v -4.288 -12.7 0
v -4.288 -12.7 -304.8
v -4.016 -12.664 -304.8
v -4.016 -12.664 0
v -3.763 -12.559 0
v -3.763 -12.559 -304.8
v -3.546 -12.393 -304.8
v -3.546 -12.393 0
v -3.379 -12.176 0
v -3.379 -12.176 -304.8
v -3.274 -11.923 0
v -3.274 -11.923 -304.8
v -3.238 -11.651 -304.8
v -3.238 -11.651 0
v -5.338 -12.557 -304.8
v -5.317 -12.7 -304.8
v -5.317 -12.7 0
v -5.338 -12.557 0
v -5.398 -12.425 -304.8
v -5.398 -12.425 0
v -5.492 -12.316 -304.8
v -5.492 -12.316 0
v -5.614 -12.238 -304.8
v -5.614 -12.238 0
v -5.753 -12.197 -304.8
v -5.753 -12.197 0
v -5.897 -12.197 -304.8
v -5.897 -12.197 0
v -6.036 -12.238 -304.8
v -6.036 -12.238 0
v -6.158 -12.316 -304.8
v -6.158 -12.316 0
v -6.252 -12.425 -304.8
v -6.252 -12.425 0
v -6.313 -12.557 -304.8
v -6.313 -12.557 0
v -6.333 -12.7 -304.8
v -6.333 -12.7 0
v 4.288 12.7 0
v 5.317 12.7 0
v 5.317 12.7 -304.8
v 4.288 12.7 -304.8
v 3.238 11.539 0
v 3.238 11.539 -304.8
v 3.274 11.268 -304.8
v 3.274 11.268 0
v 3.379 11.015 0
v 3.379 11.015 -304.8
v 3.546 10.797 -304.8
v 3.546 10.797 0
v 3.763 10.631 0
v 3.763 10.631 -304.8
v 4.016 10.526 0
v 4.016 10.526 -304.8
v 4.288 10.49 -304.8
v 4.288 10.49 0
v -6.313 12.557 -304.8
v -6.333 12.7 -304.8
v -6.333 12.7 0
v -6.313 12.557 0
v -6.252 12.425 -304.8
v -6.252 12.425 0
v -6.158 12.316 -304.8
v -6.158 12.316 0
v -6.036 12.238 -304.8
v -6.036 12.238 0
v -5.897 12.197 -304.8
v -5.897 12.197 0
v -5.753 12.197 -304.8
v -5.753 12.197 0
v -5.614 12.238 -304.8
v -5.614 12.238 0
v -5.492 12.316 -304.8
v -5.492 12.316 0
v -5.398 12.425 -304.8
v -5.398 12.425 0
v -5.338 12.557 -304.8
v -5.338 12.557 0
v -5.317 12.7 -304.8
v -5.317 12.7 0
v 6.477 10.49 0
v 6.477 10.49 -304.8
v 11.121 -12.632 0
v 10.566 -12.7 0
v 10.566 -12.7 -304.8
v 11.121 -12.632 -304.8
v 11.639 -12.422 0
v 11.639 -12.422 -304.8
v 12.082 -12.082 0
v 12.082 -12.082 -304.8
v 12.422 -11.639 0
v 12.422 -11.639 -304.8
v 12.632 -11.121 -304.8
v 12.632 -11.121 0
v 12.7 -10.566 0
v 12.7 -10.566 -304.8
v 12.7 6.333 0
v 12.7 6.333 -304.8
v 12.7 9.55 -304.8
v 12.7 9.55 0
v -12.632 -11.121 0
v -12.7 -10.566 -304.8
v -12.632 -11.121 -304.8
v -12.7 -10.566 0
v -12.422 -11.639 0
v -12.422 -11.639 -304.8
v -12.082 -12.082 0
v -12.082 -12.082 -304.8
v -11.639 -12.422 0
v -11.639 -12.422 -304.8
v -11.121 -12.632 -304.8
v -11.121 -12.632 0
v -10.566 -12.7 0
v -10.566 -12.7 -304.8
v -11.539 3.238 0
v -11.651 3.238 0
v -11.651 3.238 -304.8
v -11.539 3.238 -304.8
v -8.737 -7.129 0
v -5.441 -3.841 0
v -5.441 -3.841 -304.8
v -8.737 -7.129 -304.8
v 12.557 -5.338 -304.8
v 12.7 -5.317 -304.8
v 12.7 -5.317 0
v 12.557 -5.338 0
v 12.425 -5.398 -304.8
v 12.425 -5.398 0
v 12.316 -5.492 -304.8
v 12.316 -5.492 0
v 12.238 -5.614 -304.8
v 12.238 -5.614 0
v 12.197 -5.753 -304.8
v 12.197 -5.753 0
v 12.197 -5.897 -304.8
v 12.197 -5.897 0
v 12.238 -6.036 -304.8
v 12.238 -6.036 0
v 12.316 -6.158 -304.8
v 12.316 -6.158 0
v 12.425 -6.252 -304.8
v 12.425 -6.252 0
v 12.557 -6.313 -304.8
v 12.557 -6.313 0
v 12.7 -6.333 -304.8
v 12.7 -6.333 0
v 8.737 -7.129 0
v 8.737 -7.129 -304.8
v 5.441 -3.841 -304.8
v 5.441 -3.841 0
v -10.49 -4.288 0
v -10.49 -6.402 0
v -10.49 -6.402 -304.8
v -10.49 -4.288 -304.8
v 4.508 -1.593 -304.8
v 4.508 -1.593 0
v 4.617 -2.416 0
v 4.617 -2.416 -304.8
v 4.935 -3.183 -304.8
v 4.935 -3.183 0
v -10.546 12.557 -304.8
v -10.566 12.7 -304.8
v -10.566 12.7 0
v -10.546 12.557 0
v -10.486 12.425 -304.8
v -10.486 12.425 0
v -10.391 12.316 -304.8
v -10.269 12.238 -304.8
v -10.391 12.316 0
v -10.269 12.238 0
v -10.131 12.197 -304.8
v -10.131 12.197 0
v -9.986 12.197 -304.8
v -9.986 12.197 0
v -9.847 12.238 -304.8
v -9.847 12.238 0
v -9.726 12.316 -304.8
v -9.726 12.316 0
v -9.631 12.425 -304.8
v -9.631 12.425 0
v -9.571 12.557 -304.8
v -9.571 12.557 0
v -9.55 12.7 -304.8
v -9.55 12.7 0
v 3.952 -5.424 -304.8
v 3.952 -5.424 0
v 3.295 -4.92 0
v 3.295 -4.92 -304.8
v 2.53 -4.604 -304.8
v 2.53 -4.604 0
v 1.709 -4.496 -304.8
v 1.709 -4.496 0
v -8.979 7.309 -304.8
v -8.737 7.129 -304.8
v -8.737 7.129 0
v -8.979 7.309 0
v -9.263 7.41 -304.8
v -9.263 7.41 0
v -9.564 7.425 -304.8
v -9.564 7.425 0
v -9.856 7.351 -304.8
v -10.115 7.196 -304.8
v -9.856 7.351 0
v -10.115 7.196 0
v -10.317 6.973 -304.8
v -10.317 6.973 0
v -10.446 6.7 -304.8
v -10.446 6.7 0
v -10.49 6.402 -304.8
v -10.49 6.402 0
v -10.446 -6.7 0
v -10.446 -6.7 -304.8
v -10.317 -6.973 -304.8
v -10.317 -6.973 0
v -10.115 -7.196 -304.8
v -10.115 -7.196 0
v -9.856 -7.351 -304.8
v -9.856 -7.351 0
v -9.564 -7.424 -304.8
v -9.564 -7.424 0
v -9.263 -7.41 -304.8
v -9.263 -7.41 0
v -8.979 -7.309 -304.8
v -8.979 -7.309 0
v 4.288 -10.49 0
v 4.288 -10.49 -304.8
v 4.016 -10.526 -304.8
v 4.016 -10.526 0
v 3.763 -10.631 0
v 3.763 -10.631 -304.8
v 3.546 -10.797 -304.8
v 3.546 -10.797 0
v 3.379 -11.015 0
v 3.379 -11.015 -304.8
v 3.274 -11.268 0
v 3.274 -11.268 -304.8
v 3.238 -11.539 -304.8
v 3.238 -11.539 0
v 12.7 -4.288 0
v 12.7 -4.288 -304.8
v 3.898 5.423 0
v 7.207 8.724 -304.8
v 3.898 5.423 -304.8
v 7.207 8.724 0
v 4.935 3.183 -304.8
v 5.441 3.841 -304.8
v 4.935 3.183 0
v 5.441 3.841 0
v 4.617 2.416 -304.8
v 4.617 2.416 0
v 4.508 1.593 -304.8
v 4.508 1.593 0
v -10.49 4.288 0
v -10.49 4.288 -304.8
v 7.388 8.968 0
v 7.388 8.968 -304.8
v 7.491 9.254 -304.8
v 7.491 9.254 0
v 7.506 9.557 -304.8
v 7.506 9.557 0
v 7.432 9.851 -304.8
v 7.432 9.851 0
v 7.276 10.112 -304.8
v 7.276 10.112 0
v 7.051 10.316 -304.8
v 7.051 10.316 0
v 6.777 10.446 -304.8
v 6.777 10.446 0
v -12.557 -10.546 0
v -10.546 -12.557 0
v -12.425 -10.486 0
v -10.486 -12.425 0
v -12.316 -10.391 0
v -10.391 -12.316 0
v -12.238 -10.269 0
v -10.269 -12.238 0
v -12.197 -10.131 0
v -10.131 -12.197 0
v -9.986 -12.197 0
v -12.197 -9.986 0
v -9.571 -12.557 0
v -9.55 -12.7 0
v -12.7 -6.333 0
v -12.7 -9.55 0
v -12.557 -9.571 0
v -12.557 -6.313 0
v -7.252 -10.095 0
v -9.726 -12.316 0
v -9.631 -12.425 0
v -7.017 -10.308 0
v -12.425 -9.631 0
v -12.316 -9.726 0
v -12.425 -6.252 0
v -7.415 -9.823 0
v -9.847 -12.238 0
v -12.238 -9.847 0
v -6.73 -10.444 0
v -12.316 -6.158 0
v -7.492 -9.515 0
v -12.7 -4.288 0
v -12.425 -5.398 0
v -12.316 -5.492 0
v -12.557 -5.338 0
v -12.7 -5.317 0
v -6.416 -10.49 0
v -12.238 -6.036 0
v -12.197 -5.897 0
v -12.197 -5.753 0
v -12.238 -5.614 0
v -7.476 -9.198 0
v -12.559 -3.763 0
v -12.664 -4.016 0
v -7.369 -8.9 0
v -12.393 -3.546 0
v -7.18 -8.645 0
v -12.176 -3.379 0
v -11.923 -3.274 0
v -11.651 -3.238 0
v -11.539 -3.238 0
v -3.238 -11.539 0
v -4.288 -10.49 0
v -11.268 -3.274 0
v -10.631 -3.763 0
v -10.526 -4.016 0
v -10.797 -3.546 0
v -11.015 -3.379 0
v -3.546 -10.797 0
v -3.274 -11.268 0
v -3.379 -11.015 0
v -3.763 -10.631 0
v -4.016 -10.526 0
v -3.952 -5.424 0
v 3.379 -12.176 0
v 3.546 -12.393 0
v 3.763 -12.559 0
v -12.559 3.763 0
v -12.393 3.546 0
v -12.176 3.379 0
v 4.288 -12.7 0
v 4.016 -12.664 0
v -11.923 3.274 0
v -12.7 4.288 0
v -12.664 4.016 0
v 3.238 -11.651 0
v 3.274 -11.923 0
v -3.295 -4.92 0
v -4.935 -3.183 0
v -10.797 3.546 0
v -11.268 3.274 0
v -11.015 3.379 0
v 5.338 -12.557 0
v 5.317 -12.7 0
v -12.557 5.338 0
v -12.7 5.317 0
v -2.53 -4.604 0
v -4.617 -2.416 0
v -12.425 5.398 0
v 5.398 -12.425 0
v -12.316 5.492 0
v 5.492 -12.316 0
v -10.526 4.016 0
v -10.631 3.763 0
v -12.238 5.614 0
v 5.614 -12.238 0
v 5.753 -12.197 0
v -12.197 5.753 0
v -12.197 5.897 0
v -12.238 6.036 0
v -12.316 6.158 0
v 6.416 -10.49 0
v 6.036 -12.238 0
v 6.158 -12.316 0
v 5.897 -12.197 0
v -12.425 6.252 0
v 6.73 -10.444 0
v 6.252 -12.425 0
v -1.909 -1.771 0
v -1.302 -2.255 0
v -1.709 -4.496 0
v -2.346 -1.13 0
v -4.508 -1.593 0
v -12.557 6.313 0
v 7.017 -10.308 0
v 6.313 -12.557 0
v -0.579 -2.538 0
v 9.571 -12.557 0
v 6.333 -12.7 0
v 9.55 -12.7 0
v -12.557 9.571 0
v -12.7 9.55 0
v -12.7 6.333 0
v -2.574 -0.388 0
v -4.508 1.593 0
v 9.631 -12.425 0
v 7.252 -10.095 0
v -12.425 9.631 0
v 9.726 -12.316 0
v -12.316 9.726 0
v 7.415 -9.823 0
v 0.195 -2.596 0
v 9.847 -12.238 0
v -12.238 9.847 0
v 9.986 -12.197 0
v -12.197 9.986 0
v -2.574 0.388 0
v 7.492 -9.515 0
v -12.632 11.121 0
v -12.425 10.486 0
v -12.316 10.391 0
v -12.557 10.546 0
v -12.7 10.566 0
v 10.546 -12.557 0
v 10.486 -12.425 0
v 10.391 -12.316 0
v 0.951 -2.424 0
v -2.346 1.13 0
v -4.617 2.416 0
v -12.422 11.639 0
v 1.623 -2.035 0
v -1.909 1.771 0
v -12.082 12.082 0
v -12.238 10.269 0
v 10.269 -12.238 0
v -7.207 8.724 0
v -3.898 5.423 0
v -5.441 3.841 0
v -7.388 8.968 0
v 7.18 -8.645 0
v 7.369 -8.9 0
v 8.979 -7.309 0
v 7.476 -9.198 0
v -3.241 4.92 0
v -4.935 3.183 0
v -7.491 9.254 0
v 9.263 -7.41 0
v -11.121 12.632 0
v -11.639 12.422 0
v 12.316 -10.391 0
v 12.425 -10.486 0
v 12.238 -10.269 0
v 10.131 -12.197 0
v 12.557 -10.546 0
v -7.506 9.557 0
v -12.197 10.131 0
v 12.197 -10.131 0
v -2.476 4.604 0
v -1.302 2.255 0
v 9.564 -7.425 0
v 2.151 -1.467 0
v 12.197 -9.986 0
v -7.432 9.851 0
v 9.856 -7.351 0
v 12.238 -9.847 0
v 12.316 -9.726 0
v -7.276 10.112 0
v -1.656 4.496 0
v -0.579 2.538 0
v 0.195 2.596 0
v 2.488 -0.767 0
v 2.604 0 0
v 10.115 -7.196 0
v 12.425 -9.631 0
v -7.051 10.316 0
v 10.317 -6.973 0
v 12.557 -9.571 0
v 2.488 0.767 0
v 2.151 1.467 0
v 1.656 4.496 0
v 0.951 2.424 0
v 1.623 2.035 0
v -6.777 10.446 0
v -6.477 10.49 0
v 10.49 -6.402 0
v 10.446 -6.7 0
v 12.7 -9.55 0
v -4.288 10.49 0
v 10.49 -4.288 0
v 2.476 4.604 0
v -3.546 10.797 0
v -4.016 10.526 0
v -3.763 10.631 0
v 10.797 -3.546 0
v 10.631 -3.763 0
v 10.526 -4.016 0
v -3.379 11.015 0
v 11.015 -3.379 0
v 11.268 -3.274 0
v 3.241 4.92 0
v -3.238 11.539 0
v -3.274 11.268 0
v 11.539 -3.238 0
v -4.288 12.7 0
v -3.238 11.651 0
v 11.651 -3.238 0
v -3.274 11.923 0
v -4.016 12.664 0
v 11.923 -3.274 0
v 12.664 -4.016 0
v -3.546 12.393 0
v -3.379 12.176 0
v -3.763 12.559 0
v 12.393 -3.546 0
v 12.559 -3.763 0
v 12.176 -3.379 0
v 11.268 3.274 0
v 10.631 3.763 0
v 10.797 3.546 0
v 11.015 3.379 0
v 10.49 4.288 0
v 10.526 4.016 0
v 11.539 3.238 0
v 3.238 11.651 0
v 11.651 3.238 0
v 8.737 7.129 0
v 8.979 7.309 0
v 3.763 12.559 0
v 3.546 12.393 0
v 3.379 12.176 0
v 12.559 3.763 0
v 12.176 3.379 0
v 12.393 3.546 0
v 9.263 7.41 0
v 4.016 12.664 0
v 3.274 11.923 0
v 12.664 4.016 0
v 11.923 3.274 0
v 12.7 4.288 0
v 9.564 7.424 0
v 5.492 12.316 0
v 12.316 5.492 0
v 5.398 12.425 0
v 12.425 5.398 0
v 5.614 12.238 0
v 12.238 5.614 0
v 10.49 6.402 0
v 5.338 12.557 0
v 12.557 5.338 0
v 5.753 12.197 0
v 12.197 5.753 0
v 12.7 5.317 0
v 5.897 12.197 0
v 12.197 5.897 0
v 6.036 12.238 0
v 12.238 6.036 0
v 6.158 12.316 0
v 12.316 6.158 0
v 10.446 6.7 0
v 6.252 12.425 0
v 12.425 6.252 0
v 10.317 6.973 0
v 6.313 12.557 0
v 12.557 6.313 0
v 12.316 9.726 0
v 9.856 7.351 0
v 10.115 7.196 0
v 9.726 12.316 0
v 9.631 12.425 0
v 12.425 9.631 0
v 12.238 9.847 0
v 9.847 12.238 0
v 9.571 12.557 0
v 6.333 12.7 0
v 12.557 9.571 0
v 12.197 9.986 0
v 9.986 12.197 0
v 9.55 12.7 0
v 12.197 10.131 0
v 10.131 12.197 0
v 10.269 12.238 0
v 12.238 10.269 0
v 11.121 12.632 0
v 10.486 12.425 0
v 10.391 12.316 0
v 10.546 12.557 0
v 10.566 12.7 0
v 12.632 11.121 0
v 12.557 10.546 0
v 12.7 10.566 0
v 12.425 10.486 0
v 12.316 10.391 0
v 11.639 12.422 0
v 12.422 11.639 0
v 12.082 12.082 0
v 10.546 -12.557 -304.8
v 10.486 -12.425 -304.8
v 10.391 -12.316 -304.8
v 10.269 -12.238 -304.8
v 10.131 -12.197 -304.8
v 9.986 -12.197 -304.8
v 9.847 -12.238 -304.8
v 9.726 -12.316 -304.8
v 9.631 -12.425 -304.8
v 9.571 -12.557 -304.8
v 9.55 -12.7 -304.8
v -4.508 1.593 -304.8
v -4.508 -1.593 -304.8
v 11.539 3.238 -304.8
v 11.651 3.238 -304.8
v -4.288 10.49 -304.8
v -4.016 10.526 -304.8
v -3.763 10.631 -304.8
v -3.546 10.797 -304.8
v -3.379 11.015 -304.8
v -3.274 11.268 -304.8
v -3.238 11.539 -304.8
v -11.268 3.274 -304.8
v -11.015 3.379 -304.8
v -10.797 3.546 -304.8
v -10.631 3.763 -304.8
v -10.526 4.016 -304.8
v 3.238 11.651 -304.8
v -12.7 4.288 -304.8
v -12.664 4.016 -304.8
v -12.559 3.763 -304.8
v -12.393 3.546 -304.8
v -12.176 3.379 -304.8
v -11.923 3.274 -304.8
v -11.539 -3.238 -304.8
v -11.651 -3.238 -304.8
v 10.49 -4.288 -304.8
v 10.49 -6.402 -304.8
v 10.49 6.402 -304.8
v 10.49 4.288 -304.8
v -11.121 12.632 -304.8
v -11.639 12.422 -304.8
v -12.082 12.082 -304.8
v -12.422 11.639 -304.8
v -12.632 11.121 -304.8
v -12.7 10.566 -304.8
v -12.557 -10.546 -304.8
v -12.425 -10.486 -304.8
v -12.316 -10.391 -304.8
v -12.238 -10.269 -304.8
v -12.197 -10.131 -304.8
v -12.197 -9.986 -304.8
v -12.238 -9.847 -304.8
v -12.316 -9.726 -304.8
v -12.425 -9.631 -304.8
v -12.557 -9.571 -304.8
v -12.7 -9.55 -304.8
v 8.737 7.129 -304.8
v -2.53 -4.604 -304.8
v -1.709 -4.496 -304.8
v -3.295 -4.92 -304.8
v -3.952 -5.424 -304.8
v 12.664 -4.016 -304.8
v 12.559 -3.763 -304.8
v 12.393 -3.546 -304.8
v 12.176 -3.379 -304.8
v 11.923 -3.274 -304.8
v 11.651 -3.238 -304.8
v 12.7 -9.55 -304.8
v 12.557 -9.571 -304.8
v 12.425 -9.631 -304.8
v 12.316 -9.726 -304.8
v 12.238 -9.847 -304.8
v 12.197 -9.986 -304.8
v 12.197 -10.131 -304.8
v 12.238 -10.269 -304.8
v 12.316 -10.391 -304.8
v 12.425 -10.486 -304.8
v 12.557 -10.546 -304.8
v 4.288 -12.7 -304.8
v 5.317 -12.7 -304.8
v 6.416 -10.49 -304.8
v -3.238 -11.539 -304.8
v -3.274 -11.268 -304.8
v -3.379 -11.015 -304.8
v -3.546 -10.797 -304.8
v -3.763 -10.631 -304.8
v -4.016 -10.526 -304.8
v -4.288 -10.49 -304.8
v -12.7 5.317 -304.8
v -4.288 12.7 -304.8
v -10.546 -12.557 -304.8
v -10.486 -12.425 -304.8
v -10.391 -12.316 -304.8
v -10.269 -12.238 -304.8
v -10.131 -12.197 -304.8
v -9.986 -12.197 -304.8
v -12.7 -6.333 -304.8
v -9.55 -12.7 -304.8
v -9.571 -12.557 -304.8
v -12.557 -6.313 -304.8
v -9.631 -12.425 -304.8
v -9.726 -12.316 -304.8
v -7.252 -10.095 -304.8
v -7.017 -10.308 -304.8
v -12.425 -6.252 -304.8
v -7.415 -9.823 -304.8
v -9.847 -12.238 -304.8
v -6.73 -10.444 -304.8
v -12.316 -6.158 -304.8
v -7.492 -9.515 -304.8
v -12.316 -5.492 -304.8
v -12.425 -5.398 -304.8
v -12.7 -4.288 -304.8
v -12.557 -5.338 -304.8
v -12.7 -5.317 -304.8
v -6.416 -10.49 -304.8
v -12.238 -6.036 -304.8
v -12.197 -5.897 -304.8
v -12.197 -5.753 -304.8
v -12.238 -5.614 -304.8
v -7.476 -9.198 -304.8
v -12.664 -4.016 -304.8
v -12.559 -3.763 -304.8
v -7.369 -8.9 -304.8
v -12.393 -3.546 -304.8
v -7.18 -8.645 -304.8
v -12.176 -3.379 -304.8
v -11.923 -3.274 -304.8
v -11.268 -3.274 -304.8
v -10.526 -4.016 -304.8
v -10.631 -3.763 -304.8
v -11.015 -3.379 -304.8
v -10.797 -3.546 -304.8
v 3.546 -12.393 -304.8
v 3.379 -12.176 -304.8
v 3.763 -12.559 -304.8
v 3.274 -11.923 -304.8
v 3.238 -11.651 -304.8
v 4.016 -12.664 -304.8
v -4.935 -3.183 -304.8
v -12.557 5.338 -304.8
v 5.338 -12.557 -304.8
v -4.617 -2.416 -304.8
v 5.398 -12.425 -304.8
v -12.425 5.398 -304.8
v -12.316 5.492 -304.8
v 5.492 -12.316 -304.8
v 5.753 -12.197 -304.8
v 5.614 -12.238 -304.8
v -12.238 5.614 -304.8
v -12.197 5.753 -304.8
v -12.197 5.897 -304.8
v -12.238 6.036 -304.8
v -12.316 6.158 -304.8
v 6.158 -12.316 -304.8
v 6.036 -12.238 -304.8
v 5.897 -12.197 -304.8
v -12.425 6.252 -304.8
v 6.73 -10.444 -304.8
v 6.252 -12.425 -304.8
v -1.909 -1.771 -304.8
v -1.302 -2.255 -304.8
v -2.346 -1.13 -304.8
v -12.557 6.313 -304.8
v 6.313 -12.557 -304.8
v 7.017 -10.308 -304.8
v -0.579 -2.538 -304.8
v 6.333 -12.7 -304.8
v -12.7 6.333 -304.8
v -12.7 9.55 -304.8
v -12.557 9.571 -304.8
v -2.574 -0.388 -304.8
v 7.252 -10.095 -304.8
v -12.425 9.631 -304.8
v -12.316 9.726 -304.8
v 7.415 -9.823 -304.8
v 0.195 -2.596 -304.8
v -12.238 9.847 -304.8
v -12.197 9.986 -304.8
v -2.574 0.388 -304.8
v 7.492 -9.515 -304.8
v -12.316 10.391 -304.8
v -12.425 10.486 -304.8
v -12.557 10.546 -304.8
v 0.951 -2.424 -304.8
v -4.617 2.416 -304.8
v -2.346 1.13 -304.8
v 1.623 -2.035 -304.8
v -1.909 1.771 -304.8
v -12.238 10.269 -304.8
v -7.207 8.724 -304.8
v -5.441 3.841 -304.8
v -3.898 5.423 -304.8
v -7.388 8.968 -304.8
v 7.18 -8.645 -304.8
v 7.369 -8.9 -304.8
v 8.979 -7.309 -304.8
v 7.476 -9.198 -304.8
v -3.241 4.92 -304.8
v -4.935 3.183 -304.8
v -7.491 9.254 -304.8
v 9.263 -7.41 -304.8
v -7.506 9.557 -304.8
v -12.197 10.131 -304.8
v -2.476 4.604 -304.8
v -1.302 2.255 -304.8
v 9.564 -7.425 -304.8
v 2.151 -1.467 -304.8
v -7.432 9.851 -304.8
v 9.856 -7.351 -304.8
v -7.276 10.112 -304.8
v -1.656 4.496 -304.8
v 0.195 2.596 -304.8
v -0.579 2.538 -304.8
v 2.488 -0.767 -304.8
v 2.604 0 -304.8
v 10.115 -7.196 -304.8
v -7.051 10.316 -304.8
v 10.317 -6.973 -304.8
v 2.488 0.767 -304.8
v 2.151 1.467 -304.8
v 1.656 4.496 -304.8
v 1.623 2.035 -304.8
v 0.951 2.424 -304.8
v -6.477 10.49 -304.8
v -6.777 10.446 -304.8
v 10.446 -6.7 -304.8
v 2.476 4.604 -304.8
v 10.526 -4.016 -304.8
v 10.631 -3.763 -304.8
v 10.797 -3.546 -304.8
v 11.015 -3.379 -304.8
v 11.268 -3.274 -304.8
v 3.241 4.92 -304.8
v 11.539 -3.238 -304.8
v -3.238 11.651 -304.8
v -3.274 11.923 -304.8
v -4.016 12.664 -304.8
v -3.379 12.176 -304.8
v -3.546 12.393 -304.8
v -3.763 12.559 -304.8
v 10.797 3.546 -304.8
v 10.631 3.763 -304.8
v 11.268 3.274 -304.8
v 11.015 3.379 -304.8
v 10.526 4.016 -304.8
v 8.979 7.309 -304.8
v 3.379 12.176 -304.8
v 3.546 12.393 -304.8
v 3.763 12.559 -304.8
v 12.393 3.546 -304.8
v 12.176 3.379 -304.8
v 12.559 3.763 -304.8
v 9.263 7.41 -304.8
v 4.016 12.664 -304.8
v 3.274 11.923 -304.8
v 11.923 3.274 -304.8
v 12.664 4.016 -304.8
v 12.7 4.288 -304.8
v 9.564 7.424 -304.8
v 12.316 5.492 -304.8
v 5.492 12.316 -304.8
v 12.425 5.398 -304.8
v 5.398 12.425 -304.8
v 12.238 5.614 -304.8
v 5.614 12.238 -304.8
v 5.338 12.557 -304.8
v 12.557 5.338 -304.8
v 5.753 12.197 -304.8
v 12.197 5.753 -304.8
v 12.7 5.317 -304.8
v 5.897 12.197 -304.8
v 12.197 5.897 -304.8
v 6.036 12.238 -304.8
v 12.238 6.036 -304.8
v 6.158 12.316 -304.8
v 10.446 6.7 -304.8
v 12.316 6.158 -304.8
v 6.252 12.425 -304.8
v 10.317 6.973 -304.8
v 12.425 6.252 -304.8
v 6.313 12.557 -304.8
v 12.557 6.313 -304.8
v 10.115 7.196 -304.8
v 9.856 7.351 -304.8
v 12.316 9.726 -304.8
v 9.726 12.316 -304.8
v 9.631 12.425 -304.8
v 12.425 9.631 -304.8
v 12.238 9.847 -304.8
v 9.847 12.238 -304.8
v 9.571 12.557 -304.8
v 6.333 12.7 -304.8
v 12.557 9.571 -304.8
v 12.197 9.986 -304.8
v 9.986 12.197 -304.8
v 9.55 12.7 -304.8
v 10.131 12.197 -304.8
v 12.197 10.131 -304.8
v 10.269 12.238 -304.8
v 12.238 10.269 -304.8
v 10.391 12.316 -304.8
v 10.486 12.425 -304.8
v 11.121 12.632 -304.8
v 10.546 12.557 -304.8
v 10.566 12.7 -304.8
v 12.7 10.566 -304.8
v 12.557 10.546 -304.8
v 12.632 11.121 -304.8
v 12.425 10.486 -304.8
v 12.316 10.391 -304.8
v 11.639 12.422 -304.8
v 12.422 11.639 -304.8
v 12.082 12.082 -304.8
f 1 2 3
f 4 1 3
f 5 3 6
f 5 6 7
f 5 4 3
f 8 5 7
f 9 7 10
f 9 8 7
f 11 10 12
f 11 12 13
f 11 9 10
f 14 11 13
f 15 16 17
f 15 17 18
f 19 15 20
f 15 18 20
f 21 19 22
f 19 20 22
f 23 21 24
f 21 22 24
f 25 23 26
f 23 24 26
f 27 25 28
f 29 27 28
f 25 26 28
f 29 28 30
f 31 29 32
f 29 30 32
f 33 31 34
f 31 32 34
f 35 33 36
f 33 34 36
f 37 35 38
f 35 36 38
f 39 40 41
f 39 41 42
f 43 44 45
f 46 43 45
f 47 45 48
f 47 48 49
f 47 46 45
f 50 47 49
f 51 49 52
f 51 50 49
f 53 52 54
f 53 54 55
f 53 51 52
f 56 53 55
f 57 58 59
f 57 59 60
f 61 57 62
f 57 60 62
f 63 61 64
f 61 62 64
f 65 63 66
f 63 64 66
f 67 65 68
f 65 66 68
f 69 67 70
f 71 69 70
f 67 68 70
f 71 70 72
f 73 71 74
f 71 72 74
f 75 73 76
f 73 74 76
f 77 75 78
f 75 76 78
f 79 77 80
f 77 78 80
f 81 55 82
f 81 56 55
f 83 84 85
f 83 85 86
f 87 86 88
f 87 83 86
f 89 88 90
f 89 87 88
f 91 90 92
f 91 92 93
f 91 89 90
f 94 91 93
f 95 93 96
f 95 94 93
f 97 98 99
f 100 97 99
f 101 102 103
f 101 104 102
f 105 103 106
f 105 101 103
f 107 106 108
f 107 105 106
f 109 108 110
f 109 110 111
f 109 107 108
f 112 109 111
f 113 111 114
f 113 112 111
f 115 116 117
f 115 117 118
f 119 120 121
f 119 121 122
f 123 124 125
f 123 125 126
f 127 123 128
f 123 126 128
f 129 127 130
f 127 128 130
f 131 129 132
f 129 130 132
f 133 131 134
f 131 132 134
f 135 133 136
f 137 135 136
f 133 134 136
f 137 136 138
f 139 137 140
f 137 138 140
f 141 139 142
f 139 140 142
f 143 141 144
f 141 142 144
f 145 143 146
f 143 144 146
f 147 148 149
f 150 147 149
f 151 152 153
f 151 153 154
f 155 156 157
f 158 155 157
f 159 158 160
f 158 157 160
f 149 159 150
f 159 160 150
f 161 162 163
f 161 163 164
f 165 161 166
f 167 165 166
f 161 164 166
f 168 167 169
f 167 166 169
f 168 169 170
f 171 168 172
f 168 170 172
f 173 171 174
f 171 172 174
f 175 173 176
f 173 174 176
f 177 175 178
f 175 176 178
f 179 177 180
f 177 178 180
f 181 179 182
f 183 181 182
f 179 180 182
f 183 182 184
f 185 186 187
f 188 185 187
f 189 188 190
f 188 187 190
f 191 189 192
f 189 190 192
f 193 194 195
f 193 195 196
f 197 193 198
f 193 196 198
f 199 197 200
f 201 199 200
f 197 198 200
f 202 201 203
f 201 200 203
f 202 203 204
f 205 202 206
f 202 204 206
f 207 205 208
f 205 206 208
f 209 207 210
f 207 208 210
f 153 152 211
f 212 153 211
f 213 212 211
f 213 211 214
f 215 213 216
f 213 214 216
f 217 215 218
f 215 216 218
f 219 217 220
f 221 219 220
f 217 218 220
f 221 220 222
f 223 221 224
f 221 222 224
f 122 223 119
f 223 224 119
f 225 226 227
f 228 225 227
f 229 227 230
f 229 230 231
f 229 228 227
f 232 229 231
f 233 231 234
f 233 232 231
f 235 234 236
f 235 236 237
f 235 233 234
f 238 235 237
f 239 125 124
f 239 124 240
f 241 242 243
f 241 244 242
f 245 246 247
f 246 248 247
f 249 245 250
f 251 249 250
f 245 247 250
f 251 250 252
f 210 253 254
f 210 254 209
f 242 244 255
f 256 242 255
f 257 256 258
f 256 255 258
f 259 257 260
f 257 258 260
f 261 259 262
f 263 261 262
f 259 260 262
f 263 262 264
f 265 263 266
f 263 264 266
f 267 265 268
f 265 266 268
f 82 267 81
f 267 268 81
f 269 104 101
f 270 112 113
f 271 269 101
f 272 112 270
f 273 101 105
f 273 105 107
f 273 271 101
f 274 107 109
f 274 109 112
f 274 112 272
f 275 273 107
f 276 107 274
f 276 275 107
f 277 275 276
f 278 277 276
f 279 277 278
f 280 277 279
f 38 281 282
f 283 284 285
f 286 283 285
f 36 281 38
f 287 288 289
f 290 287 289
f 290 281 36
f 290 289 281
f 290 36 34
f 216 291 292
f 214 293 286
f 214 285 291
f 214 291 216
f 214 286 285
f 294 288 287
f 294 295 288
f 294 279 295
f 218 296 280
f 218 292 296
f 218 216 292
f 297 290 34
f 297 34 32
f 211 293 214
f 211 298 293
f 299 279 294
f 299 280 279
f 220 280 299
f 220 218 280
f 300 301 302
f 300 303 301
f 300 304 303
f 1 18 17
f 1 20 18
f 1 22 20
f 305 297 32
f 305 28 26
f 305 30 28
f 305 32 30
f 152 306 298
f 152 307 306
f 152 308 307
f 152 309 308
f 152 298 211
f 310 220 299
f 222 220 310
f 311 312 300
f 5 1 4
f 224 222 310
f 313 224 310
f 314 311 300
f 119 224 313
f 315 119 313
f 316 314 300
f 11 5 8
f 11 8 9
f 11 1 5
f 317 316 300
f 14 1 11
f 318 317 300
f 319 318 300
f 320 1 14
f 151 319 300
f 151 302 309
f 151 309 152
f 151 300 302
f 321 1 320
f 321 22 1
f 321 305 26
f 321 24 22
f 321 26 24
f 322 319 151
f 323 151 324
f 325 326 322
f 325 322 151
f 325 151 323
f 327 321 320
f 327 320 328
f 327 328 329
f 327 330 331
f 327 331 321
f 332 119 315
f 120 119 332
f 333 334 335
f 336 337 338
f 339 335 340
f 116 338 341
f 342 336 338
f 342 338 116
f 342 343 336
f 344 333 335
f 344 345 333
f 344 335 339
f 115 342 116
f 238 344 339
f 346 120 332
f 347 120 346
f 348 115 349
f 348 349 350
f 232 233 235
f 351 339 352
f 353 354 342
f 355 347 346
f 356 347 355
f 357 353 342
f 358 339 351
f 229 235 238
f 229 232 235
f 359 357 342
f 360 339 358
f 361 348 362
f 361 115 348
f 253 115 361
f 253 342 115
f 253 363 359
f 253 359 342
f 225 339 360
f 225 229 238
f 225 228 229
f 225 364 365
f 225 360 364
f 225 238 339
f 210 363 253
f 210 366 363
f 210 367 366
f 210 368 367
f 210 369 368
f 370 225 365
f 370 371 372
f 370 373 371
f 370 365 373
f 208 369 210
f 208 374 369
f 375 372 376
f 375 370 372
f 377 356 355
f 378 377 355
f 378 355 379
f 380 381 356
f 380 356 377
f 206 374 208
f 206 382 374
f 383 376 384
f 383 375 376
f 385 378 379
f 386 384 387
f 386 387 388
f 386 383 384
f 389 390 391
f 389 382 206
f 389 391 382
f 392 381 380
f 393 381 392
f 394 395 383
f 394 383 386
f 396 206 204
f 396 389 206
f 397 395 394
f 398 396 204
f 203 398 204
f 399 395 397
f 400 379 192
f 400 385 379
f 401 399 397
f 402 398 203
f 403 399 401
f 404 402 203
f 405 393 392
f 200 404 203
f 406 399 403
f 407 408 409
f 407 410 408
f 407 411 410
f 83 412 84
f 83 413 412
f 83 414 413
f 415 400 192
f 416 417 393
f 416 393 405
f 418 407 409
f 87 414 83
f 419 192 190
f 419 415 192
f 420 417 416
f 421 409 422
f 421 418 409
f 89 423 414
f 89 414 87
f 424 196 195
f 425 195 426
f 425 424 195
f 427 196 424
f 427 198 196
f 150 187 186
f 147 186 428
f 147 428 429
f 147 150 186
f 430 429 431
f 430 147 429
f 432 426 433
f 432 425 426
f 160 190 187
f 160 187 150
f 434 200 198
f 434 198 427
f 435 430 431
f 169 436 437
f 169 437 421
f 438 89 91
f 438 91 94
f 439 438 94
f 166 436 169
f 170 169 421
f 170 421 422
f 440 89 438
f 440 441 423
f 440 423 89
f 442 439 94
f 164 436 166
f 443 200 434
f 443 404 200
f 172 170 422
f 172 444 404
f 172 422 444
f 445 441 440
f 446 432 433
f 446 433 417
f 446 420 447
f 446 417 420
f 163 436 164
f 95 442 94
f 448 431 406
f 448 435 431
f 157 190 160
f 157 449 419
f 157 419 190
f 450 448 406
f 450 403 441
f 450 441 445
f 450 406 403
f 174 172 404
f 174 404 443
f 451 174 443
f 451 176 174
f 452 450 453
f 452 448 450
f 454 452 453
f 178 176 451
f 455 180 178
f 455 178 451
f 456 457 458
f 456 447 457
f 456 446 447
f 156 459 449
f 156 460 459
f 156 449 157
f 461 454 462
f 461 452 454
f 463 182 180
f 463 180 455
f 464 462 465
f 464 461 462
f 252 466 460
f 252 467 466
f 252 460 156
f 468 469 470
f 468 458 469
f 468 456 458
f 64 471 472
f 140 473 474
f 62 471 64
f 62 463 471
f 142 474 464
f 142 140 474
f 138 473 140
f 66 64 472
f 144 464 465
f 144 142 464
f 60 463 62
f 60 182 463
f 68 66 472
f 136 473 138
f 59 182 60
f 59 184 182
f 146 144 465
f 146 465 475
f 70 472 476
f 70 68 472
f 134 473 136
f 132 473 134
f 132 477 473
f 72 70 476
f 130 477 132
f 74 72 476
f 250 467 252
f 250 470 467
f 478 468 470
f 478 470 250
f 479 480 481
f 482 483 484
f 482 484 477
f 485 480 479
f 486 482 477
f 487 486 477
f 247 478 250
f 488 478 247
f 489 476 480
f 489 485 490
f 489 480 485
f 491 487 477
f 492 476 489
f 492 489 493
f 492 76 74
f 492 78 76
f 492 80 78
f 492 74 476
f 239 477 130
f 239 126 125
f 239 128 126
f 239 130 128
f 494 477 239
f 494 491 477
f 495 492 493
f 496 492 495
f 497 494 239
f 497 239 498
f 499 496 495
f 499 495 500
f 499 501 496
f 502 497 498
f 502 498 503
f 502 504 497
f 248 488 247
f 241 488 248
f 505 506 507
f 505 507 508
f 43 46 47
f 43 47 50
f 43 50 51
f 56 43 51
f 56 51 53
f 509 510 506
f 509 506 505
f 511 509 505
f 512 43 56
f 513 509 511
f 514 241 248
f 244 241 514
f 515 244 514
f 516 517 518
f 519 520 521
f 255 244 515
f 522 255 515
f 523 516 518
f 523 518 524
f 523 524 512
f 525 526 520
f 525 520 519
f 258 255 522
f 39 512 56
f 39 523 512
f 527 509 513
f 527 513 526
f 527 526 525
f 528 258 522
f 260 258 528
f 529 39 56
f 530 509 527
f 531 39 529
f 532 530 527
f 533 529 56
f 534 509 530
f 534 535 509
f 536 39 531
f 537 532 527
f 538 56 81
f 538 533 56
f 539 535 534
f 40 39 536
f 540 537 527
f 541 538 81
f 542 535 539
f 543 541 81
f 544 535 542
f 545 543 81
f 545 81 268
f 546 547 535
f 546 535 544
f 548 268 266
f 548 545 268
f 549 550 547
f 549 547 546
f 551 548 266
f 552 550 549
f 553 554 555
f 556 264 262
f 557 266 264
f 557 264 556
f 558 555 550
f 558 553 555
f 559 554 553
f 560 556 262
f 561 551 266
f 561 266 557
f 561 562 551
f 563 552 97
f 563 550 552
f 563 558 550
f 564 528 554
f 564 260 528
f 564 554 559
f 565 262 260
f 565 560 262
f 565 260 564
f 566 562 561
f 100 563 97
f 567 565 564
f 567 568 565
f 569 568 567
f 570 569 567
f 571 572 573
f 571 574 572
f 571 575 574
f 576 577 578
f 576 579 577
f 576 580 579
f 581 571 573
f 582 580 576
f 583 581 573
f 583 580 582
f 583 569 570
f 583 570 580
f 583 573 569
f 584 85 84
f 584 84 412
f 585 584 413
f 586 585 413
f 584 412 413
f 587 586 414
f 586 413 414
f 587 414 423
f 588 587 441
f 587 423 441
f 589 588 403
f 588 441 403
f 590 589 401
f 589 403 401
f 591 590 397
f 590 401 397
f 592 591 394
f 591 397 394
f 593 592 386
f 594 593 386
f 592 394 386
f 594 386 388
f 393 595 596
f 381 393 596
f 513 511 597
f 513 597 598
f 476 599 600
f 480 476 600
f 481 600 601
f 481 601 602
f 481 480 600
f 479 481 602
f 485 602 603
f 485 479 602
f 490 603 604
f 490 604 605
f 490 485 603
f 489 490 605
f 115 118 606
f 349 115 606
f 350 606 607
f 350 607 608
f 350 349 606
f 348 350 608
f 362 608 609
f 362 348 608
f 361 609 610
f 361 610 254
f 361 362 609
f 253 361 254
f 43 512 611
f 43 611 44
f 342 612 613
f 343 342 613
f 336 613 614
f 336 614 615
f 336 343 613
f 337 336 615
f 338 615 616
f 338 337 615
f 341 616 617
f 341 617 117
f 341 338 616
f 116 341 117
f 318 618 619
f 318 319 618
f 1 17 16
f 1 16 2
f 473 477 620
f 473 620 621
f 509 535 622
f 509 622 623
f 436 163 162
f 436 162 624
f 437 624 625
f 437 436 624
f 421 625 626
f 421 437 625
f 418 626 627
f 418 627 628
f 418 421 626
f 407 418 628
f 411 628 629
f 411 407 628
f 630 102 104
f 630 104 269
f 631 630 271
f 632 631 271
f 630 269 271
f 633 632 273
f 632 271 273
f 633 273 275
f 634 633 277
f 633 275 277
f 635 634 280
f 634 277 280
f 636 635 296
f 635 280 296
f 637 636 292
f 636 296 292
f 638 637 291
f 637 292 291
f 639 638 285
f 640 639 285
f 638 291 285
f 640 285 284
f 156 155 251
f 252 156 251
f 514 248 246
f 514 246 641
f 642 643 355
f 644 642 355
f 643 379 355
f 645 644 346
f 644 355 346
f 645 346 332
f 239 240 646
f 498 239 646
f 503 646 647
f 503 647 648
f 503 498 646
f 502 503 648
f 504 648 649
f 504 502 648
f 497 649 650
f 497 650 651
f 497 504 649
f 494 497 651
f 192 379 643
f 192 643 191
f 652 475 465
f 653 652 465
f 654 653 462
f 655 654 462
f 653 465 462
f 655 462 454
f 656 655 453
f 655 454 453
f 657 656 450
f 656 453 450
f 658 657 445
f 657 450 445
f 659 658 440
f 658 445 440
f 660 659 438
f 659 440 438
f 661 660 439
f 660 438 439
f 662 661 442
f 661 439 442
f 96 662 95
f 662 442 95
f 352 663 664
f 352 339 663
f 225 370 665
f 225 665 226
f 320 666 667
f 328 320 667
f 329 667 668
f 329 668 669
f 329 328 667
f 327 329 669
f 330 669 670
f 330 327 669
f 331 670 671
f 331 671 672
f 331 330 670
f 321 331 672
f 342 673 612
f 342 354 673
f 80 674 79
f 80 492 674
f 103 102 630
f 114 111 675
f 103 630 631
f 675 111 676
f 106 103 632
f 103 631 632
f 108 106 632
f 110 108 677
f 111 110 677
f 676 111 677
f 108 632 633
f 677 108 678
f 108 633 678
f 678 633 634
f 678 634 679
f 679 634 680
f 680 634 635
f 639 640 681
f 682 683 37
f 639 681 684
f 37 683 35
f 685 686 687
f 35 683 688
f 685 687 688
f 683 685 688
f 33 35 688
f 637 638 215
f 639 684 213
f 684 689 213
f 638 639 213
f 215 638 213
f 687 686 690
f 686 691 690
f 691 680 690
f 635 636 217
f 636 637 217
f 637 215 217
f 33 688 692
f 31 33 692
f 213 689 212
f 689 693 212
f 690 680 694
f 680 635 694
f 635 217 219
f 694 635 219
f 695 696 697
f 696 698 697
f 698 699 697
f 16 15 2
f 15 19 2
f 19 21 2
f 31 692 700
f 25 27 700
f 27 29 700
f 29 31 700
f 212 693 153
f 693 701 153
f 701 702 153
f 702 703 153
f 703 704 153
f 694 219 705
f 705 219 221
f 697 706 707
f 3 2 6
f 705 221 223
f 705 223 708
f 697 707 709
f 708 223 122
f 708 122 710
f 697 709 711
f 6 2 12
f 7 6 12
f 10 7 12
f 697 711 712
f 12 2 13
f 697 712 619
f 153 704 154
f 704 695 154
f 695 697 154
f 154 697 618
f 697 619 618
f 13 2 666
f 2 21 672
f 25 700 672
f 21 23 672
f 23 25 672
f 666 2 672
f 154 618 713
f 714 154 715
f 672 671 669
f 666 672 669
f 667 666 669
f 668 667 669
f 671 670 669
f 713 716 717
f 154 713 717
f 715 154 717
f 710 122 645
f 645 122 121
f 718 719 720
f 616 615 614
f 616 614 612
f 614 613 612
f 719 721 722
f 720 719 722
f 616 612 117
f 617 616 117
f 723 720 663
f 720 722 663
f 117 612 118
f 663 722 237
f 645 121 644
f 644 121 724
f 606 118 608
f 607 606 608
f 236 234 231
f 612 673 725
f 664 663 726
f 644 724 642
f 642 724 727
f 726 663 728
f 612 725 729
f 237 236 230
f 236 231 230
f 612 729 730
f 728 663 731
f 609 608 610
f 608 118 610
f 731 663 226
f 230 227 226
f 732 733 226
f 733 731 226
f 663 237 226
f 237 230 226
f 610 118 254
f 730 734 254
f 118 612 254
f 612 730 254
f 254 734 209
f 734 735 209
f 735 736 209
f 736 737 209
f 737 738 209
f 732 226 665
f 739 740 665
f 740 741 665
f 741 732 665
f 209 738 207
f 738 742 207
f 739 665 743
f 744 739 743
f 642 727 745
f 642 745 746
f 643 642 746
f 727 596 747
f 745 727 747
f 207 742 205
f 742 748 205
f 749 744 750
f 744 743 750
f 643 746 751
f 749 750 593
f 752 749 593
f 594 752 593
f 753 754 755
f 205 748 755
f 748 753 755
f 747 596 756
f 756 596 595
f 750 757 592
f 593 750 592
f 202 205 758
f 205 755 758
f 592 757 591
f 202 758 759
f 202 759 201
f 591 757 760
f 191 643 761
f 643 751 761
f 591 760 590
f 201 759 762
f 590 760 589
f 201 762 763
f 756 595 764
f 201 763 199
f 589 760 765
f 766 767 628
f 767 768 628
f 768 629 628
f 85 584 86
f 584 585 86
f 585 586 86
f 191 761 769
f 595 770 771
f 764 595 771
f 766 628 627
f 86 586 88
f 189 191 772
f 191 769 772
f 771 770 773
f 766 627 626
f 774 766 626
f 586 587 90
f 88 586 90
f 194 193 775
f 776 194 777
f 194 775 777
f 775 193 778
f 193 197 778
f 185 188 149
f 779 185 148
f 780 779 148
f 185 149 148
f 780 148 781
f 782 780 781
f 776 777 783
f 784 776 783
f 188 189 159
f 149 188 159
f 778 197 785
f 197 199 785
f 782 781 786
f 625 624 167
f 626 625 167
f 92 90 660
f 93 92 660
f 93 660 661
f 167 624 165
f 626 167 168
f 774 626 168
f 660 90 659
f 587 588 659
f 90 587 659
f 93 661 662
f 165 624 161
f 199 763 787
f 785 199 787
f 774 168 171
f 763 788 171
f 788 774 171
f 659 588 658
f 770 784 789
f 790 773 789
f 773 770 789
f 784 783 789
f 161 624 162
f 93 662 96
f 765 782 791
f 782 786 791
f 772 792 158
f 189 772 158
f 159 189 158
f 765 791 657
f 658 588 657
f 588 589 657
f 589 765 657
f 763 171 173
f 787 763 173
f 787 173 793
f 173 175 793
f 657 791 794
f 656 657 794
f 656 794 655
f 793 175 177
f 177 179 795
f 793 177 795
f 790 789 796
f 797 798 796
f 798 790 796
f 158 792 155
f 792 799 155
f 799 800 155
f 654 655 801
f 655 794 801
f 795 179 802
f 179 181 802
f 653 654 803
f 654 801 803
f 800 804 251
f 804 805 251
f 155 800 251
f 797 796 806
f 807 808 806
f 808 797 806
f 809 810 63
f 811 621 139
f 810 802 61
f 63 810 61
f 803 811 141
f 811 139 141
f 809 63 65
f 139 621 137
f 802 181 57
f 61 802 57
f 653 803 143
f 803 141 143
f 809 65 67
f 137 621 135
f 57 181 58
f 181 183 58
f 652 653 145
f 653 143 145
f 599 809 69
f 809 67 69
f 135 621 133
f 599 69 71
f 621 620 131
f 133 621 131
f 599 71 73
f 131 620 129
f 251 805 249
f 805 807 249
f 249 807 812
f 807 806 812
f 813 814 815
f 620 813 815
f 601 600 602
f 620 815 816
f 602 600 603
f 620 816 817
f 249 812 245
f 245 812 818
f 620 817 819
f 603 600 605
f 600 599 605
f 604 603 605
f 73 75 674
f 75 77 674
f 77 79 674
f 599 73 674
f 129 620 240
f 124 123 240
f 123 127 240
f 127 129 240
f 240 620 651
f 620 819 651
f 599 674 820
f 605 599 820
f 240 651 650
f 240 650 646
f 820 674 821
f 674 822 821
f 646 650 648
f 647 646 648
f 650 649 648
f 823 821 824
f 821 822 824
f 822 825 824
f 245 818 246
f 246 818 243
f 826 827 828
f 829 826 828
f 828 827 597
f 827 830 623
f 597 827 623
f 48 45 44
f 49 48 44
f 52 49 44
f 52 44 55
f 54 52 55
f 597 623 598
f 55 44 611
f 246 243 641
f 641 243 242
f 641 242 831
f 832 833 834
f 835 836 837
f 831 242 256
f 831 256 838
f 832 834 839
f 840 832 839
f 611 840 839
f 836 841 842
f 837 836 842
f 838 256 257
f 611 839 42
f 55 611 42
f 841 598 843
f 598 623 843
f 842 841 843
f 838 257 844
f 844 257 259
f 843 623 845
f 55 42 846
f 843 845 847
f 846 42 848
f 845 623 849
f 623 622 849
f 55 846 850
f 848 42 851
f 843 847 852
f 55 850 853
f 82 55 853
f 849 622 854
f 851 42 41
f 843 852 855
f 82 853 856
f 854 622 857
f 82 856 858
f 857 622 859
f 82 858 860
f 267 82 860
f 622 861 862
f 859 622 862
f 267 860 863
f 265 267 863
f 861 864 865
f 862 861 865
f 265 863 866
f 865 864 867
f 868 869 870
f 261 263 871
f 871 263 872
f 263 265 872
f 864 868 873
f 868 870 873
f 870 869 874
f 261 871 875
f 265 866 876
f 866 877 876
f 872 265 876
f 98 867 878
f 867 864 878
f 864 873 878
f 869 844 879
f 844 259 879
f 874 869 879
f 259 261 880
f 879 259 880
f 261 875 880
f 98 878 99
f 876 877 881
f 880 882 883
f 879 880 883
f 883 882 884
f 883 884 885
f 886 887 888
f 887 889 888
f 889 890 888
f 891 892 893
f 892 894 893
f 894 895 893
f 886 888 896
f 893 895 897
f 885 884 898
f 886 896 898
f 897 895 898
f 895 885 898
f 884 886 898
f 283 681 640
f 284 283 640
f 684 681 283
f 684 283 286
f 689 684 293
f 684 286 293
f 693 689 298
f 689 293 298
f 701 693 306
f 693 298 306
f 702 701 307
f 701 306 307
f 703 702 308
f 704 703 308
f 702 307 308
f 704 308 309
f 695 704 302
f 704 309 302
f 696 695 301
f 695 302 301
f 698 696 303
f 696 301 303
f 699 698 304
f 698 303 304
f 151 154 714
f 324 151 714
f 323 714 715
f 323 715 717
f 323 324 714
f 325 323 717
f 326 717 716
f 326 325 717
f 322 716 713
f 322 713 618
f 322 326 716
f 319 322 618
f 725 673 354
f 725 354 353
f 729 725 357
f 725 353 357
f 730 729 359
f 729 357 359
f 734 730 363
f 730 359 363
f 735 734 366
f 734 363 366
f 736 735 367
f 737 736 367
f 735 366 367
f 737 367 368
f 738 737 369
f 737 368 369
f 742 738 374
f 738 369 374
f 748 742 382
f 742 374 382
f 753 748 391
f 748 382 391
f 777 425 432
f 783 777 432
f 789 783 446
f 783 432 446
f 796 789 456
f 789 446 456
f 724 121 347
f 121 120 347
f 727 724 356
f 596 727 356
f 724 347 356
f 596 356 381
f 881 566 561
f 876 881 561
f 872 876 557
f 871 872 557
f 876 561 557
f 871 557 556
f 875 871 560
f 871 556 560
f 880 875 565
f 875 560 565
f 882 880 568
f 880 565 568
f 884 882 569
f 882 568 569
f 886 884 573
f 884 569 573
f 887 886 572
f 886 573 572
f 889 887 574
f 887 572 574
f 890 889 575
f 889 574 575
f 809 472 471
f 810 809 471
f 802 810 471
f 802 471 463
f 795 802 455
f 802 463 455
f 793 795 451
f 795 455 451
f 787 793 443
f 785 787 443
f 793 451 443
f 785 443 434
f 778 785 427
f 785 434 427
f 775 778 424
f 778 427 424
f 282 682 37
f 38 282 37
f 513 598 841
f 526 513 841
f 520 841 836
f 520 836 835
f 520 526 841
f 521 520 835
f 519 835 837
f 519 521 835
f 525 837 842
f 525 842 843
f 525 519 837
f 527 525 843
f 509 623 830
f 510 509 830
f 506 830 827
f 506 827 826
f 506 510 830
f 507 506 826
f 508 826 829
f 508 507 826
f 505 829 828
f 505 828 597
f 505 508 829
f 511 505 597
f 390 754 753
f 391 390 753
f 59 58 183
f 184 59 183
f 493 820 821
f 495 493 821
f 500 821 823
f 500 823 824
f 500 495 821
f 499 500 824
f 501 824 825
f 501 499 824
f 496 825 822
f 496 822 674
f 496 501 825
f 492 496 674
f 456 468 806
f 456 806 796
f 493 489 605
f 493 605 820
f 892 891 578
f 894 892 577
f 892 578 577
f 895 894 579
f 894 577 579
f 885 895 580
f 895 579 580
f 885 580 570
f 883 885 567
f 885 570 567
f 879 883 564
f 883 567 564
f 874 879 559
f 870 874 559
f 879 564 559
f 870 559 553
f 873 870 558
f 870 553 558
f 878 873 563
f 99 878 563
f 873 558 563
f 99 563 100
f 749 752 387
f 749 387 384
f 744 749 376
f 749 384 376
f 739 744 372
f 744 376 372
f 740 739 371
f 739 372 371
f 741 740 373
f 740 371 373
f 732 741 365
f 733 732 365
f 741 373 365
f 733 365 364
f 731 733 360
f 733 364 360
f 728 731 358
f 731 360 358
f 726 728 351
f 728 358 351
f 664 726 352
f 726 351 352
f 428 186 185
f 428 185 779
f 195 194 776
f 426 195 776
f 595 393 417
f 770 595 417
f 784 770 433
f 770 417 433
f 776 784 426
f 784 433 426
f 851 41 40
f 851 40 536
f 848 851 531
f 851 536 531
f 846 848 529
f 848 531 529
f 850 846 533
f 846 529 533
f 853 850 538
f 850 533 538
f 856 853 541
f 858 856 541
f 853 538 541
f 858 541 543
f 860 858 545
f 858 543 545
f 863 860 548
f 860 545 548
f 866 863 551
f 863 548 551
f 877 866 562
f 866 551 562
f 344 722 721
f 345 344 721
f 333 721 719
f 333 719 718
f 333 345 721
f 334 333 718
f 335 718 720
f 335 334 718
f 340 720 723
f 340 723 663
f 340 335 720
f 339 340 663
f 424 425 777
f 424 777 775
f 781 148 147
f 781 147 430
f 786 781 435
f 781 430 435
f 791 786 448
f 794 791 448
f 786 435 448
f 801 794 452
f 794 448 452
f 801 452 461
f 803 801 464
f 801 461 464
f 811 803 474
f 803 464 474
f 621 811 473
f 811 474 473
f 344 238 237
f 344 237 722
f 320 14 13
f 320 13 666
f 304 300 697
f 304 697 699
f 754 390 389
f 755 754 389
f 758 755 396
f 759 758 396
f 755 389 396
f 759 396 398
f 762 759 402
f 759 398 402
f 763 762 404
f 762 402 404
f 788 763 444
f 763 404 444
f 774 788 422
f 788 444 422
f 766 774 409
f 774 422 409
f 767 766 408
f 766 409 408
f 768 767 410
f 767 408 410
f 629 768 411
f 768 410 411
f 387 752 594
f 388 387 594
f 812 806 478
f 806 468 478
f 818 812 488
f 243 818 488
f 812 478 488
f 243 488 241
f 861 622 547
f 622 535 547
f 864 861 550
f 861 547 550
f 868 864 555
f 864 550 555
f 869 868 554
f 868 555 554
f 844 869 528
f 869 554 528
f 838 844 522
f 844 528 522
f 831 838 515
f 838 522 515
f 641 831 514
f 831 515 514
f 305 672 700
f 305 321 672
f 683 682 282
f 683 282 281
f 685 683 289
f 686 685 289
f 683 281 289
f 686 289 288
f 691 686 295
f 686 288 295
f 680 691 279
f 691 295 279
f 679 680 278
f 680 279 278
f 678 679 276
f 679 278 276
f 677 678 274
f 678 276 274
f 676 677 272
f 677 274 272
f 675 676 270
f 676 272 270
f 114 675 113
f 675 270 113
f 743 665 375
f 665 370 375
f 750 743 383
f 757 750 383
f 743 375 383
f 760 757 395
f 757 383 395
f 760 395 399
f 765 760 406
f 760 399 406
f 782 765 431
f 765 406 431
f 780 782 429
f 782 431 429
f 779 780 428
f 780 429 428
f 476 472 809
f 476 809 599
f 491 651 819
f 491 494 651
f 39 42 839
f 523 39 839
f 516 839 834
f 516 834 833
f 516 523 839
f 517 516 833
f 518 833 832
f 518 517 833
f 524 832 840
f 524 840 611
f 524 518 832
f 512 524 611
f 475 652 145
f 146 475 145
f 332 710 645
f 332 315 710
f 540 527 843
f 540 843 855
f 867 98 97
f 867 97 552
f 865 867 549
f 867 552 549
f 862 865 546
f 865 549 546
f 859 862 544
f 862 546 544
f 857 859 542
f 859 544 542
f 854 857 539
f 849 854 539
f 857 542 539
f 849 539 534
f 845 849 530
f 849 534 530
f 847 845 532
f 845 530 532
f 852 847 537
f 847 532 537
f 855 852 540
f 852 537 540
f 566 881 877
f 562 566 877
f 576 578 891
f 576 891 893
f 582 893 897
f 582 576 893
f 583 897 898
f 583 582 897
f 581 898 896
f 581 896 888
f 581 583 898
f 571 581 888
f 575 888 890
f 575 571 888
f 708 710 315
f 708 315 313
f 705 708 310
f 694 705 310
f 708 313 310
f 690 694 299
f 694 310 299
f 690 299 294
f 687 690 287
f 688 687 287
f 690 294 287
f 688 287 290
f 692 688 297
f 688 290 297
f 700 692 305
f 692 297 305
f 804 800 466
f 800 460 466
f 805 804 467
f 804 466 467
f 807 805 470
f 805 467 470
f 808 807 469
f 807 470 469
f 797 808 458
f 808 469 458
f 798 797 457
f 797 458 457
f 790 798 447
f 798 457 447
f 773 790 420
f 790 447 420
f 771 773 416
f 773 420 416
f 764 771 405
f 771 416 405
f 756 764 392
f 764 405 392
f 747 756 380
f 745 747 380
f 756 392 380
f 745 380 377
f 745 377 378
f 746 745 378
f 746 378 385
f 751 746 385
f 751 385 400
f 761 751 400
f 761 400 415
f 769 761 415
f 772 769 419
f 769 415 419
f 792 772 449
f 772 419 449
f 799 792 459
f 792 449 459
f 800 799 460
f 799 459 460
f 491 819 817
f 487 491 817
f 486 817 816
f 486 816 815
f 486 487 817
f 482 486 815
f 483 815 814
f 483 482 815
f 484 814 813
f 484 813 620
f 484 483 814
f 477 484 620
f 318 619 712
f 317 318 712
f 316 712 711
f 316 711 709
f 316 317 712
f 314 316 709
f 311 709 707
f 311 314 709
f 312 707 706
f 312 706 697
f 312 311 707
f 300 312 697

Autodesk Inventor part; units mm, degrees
ref_plane "YZ Plane" through (0, 0, 0) normal (1, 0, 0) x (0, 1, 0)
ref_plane "XZ Plane" through (0, 0, 0) normal (0, 1, 0) x (-1, 0, 0)
ref_plane "XY Plane" through (0, 0, 0) normal (0, 0, 1) x (1, 0, 0)
sketch "Sketch1" plane through (0, 0, 0) normal (0, 0, 1) x (1, 0, 0)
  circle A0 centre (0, 0) radius 2.6035
  arc A1 (-1.7093, -4.4958) -> (-3.9523, -5.4237) centre (-1.7093, -7.6708) ccw
  line L0 (-1.7093, -4.4958) -> (1.7093, -4.4958)
  arc A2 (3.9523, -5.4237) -> (1.7093, -4.4958) centre (1.7093, -7.6708) ccw
  line L1 (3.9523, -5.4237) -> (7.1797, -8.6452)
  arc A3 (6.4164, -10.4902) -> (7.1797, -8.6452) centre (6.4164, -9.4098) ccw
  line L2 (6.4164, -10.4902) -> (4.2875, -10.4902)
  arc A4 (4.2875, -10.4902) -> (3.2385, -11.5392) centre (4.2875, -11.5392) ccw
  line L3 (3.2385, -11.5392) -> (3.2385, -11.651)
  arc A5 (3.2385, -11.651) -> (4.2875, -12.7) centre (4.2875, -11.651) ccw
  line L4 (4.2875, -12.7) -> (5.3171, -12.7)
  arc A6 (6.3331, -12.7) -> (5.3171, -12.7) centre (5.8251, -12.7) ccw
  line L5 (6.3331, -12.7) -> (9.5504, -12.7)
  arc A7 (10.5664, -12.6998) -> (9.5504, -12.7) centre (10.0584, -12.7) ccw
  arc A8 (10.5664, -12.6998) -> (12.6998, -10.5664) centre (10.5918, -10.5918) ccw
  arc A9 (12.7, -9.5504) -> (12.6998, -10.5664) centre (12.7, -10.0584) ccw
  line L6 (12.7, -9.5504) -> (12.7, -6.3331)
  arc A10 (12.7, -5.3171) -> (12.7, -6.3331) centre (12.7, -5.8251) ccw
  line L7 (12.7, -5.3171) -> (12.7, -4.2875)
  arc A11 (12.7, -4.2875) -> (11.651, -3.2385) centre (11.651, -4.2875) ccw
  line L8 (11.651, -3.2385) -> (11.5392, -3.2385)
  arc A12 (11.5392, -3.2385) -> (10.4902, -4.2875) centre (11.5392, -4.2875) ccw
  line L9 (10.4902, -4.2875) -> (10.4902, -6.4021)
  arc A13 (8.7371, -7.1294) -> (10.4902, -6.4021) centre (9.4628, -6.4021) ccw
  line L10 (8.7371, -7.1294) -> (5.441, -3.8408)
  arc A14 (4.5085, -1.5932) -> (5.441, -3.8408) centre (7.6835, -1.5932) ccw
  line L11 (4.5085, -1.5932) -> (4.5085, 1.5932)
  arc A15 (5.441, 3.8408) -> (4.5085, 1.5932) centre (7.6835, 1.5932) ccw
  line L12 (5.441, 3.8408) -> (8.7371, 7.1294)
  arc A16 (10.4902, 6.4021) -> (8.7371, 7.1294) centre (9.4628, 6.4021) ccw
  line L13 (10.4902, 6.4021) -> (10.4902, 4.2875)
  arc A17 (10.4902, 4.2875) -> (11.5392, 3.2385) centre (11.5392, 4.2875) ccw
  line L14 (11.5392, 3.2385) -> (11.651, 3.2385)
  arc A18 (11.651, 3.2385) -> (12.7, 4.2875) centre (11.651, 4.2875) ccw
  line L15 (12.7, 4.2875) -> (12.7, 5.3171)
  arc A19 (12.7, 6.3331) -> (12.7, 5.3171) centre (12.7, 5.8251) ccw
  line L16 (12.7, 6.3331) -> (12.7, 9.5504)
  arc A20 (12.6998, 10.5664) -> (12.7, 9.5504) centre (12.7, 10.0584) ccw
  arc A21 (12.6998, 10.5664) -> (10.5664, 12.6998) centre (10.5918, 10.5918) ccw
  arc A22 (9.5504, 12.7) -> (10.5664, 12.6998) centre (10.0584, 12.7) ccw
  line L17 (9.5504, 12.7) -> (6.3331, 12.7)
  arc A23 (5.3171, 12.7) -> (6.3331, 12.7) centre (5.8251, 12.7) ccw
  line L18 (5.3171, 12.7) -> (4.2875, 12.7)
  arc A24 (4.2875, 12.7) -> (3.2385, 11.651) centre (4.2875, 11.651) ccw
  line L19 (3.2385, 11.651) -> (3.2385, 11.5392)
  arc A25 (3.2385, 11.5392) -> (4.2875, 10.4902) centre (4.2875, 11.5392) ccw
  line L20 (4.2875, 10.4902) -> (6.4768, 10.4902)
  arc A26 (7.207, 8.7244) -> (6.4768, 10.4902) centre (6.4768, 9.4563) ccw
  line L21 (7.207, 8.7244) -> (3.8983, 5.4232)
  arc A27 (1.6558, 4.4958) -> (3.8983, 5.4232) centre (1.6558, 7.6708) ccw
  line L22 (1.6558, 4.4958) -> (-1.6558, 4.4958)
  arc A28 (-3.8983, 5.4232) -> (-1.6558, 4.4958) centre (-1.6558, 7.6708) ccw
  line L23 (-3.8983, 5.4232) -> (-7.207, 8.7244)
  arc A29 (-6.4768, 10.4902) -> (-7.207, 8.7244) centre (-6.4768, 9.4563) ccw
  line L24 (-6.4768, 10.4902) -> (-4.2875, 10.4902)
  arc A30 (-4.2875, 10.4902) -> (-3.2385, 11.5392) centre (-4.2875, 11.5392) ccw
  line L25 (-3.2385, 11.5392) -> (-3.2385, 11.651)
  arc A31 (-3.2385, 11.651) -> (-4.2875, 12.7) centre (-4.2875, 11.651) ccw
  line L26 (-4.2875, 12.7) -> (-5.3171, 12.7)
  arc A32 (-6.3331, 12.7) -> (-5.3171, 12.7) centre (-5.8251, 12.7) ccw
  line L27 (-6.3331, 12.7) -> (-9.5504, 12.7)
  arc A33 (-10.5664, 12.6998) -> (-9.5504, 12.7) centre (-10.0584, 12.7) ccw
  arc A34 (-10.5664, 12.6998) -> (-12.6998, 10.5664) centre (-10.5918, 10.5918) ccw
  arc A35 (-12.7, 9.5504) -> (-12.6998, 10.5664) centre (-12.7, 10.0584) ccw
  line L28 (-12.7, 9.5504) -> (-12.7, 6.3331)
  arc A36 (-12.7, 5.3171) -> (-12.7, 6.3331) centre (-12.7, 5.8251) ccw
  line L29 (-12.7, 5.3171) -> (-12.7, 4.2875)
  arc A37 (-12.7, 4.2875) -> (-11.651, 3.2385) centre (-11.651, 4.2875) ccw
  line L30 (-11.651, 3.2385) -> (-11.5392, 3.2385)
  arc A38 (-11.5392, 3.2385) -> (-10.4902, 4.2875) centre (-11.5392, 4.2875) ccw
  line L31 (-10.4902, 4.2875) -> (-10.4902, 6.4021)
  arc A39 (-8.7371, 7.1294) -> (-10.4902, 6.4021) centre (-9.4628, 6.4021) ccw
  line L32 (-8.7371, 7.1294) -> (-5.441, 3.8408)
  arc A40 (-4.5085, 1.5932) -> (-5.441, 3.8408) centre (-7.6835, 1.5932) ccw
  line L33 (-4.5085, 1.5932) -> (-4.5085, -1.5932)
  arc A41 (-5.441, -3.8408) -> (-4.5085, -1.5932) centre (-7.6835, -1.5932) ccw
  line L34 (-5.441, -3.8408) -> (-8.7371, -7.1294)
  arc A42 (-10.4902, -6.4021) -> (-8.7371, -7.1294) centre (-9.4628, -6.4021) ccw
  line L35 (-10.4902, -6.4021) -> (-10.4902, -4.2875)
  arc A43 (-10.4902, -4.2875) -> (-11.5392, -3.2385) centre (-11.5392, -4.2875) ccw
  line L36 (-11.5392, -3.2385) -> (-11.651, -3.2385)
  arc A44 (-11.651, -3.2385) -> (-12.7, -4.2875) centre (-11.651, -4.2875) ccw
  line L37 (-12.7, -4.2875) -> (-12.7, -5.3171)
  arc A45 (-12.7, -6.3331) -> (-12.7, -5.3171) centre (-12.7, -5.8251) ccw
  line L38 (-12.7, -6.3331) -> (-12.7, -9.5504)
  arc A46 (-12.6998, -10.5664) -> (-12.7, -9.5504) centre (-12.7, -10.0584) ccw
  arc A47 (-12.6998, -10.5664) -> (-10.5664, -12.6998) centre (-10.5918, -10.5918) ccw
  arc A48 (-9.5504, -12.7) -> (-10.5664, -12.6998) centre (-10.0584, -12.7) ccw
  line L39 (-9.5504, -12.7) -> (-6.3331, -12.7)
  arc A49 (-5.3171, -12.7) -> (-6.3331, -12.7) centre (-5.8251, -12.7) ccw
  line L40 (-5.3171, -12.7) -> (-4.2875, -12.7)
  arc A50 (-4.2875, -12.7) -> (-3.2385, -11.651) centre (-4.2875, -11.651) ccw
  line L41 (-3.2385, -11.651) -> (-3.2385, -11.5392)
  arc A51 (-3.2385, -11.5392) -> (-4.2875, -10.4902) centre (-4.2875, -11.5392) ccw
  line L42 (-4.2875, -10.4902) -> (-6.4164, -10.4902)
  arc A52 (-7.1797, -8.6452) -> (-6.4164, -10.4902) centre (-6.4164, -9.4098) ccw
  line L43 (-7.1797, -8.6452) -> (-3.9523, -5.4237)
extrude "Extrusion1" add sketch "Sketch1" against normal blind 304.8
properties part number "1010"
